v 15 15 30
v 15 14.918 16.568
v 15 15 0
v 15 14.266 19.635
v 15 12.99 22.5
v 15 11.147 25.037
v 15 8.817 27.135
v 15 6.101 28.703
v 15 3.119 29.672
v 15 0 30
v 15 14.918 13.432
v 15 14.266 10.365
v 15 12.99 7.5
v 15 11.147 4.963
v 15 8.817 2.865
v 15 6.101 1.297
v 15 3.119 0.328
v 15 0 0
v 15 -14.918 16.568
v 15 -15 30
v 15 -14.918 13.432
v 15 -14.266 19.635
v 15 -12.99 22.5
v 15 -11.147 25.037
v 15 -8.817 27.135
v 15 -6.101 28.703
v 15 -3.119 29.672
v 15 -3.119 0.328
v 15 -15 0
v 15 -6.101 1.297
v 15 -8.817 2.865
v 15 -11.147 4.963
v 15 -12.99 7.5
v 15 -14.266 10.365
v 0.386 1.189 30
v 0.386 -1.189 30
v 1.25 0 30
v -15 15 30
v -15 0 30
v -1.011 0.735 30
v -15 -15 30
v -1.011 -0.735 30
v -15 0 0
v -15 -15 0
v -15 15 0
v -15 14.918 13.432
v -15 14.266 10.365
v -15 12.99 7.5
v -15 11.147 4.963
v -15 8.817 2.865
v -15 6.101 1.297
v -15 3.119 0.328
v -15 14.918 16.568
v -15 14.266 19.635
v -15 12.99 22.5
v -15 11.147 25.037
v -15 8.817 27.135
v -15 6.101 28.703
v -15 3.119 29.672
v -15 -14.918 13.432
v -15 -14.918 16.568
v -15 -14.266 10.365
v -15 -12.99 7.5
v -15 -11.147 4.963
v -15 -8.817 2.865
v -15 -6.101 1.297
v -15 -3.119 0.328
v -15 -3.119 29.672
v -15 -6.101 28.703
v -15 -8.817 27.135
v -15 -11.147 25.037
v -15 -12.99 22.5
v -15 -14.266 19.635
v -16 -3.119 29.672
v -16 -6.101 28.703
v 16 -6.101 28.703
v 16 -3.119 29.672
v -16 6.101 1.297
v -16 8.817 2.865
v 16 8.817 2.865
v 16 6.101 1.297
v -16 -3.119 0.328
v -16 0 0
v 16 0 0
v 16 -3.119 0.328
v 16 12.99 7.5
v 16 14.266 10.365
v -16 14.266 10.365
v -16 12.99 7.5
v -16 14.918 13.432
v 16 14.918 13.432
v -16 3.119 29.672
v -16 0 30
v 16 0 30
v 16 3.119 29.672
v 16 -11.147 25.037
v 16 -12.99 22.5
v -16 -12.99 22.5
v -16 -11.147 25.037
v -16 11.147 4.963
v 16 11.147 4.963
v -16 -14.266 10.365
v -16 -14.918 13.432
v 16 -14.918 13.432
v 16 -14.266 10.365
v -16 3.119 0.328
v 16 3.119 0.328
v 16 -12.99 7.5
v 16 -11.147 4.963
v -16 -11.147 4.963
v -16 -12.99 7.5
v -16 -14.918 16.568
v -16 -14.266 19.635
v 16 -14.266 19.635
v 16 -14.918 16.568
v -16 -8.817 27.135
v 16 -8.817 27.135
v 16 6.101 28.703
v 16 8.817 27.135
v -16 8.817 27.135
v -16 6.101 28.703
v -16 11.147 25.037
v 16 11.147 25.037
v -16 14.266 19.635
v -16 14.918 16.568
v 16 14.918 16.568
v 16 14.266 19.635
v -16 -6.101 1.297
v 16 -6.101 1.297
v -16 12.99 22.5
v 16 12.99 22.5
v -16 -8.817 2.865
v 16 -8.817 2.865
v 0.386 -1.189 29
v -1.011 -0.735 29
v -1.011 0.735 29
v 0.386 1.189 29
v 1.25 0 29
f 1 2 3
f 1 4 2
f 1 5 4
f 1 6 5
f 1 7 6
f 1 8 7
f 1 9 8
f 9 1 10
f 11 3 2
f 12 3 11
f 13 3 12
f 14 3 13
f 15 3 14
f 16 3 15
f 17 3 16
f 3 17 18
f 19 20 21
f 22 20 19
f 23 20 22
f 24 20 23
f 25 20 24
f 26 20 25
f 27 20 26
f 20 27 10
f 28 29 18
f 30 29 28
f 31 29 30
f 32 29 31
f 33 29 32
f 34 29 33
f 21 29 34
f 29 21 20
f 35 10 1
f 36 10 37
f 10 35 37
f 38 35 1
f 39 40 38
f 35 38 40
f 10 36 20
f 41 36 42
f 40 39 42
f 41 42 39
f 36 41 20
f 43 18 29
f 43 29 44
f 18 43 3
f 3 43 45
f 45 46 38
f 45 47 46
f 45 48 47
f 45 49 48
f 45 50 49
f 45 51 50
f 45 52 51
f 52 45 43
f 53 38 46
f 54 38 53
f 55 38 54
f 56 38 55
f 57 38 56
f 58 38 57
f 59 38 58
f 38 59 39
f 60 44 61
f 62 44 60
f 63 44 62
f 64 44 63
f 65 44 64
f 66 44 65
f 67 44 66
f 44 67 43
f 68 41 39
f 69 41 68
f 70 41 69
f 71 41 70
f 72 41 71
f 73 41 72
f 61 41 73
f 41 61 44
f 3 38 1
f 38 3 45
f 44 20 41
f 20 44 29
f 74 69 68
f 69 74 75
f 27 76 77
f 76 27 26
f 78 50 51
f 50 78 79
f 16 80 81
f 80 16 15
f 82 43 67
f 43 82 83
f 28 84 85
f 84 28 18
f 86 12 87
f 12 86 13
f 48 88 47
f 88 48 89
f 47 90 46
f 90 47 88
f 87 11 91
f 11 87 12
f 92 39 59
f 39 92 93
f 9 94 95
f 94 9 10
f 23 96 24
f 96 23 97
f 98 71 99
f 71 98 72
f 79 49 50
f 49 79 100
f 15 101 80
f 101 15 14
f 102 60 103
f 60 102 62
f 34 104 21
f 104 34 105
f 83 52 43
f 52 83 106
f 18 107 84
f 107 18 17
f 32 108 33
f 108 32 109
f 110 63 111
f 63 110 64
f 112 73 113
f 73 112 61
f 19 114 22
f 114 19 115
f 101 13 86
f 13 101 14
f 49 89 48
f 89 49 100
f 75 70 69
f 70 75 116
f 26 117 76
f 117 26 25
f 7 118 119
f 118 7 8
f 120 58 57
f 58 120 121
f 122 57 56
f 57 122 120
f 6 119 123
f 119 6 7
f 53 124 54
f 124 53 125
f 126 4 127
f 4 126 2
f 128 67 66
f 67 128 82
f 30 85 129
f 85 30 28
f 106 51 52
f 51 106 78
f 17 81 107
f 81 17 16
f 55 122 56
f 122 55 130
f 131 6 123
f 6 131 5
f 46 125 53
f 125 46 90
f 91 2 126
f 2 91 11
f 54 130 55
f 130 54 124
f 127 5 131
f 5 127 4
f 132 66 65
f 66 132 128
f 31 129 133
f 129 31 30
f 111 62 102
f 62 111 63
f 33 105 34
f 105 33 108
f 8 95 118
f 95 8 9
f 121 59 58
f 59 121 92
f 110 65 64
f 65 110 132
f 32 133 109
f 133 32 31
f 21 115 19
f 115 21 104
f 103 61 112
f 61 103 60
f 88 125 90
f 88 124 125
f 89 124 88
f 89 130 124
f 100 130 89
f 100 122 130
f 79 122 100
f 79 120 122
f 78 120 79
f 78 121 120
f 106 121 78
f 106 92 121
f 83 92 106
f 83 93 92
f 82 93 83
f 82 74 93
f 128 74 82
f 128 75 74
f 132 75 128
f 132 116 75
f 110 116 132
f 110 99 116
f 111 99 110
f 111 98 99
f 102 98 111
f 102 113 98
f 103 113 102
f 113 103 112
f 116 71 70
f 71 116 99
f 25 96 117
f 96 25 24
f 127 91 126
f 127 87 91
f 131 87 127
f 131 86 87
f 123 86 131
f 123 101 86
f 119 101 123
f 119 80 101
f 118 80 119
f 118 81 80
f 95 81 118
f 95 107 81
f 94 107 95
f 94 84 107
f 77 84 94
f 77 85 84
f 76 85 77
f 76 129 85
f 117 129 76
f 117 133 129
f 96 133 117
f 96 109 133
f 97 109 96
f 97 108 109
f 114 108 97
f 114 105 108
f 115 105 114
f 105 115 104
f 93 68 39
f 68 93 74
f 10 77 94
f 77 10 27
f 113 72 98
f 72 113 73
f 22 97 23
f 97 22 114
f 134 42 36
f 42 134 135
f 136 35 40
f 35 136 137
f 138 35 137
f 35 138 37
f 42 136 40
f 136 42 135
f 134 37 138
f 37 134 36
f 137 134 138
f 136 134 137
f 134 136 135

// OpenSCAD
cube_size = 30; // [10:Small,20:Medium,30:Large]

hole_diameter = 2.5; 
hole_radius = hole_diameter/2;

// How deep should the center hole be?
hole_depth = 1; // [0,1,5,50]

show_wheels = "yes"; // [yes,no]

// How thick should the side wheels be?
wheel_thickness = 1; // [1:40]

// ignore this variable!
// foo=1;

// don't turn functions into params!
function BEZ03(u) = pow((1-u), 3);

// ignore variable values
bing = 3+4;
baz = 3 / hole_depth;

difference() {
  union() {
    translate([0, 0, cube_size/2]) cube([cube_size,cube_size,cube_size], center=true);
    if (show_wheels == "yes") {
      translate([0, 0, cube_size/2]) rotate([0, 90, 0]) {
        cylinder(r=cube_size/2, h=cube_size+(wheel_thickness*2), center=true);
      }
    }
  }
  translate([0, 0, cube_size-hole_depth]) cylinder(r=hole_radius, h=hole_depth);
}
        
